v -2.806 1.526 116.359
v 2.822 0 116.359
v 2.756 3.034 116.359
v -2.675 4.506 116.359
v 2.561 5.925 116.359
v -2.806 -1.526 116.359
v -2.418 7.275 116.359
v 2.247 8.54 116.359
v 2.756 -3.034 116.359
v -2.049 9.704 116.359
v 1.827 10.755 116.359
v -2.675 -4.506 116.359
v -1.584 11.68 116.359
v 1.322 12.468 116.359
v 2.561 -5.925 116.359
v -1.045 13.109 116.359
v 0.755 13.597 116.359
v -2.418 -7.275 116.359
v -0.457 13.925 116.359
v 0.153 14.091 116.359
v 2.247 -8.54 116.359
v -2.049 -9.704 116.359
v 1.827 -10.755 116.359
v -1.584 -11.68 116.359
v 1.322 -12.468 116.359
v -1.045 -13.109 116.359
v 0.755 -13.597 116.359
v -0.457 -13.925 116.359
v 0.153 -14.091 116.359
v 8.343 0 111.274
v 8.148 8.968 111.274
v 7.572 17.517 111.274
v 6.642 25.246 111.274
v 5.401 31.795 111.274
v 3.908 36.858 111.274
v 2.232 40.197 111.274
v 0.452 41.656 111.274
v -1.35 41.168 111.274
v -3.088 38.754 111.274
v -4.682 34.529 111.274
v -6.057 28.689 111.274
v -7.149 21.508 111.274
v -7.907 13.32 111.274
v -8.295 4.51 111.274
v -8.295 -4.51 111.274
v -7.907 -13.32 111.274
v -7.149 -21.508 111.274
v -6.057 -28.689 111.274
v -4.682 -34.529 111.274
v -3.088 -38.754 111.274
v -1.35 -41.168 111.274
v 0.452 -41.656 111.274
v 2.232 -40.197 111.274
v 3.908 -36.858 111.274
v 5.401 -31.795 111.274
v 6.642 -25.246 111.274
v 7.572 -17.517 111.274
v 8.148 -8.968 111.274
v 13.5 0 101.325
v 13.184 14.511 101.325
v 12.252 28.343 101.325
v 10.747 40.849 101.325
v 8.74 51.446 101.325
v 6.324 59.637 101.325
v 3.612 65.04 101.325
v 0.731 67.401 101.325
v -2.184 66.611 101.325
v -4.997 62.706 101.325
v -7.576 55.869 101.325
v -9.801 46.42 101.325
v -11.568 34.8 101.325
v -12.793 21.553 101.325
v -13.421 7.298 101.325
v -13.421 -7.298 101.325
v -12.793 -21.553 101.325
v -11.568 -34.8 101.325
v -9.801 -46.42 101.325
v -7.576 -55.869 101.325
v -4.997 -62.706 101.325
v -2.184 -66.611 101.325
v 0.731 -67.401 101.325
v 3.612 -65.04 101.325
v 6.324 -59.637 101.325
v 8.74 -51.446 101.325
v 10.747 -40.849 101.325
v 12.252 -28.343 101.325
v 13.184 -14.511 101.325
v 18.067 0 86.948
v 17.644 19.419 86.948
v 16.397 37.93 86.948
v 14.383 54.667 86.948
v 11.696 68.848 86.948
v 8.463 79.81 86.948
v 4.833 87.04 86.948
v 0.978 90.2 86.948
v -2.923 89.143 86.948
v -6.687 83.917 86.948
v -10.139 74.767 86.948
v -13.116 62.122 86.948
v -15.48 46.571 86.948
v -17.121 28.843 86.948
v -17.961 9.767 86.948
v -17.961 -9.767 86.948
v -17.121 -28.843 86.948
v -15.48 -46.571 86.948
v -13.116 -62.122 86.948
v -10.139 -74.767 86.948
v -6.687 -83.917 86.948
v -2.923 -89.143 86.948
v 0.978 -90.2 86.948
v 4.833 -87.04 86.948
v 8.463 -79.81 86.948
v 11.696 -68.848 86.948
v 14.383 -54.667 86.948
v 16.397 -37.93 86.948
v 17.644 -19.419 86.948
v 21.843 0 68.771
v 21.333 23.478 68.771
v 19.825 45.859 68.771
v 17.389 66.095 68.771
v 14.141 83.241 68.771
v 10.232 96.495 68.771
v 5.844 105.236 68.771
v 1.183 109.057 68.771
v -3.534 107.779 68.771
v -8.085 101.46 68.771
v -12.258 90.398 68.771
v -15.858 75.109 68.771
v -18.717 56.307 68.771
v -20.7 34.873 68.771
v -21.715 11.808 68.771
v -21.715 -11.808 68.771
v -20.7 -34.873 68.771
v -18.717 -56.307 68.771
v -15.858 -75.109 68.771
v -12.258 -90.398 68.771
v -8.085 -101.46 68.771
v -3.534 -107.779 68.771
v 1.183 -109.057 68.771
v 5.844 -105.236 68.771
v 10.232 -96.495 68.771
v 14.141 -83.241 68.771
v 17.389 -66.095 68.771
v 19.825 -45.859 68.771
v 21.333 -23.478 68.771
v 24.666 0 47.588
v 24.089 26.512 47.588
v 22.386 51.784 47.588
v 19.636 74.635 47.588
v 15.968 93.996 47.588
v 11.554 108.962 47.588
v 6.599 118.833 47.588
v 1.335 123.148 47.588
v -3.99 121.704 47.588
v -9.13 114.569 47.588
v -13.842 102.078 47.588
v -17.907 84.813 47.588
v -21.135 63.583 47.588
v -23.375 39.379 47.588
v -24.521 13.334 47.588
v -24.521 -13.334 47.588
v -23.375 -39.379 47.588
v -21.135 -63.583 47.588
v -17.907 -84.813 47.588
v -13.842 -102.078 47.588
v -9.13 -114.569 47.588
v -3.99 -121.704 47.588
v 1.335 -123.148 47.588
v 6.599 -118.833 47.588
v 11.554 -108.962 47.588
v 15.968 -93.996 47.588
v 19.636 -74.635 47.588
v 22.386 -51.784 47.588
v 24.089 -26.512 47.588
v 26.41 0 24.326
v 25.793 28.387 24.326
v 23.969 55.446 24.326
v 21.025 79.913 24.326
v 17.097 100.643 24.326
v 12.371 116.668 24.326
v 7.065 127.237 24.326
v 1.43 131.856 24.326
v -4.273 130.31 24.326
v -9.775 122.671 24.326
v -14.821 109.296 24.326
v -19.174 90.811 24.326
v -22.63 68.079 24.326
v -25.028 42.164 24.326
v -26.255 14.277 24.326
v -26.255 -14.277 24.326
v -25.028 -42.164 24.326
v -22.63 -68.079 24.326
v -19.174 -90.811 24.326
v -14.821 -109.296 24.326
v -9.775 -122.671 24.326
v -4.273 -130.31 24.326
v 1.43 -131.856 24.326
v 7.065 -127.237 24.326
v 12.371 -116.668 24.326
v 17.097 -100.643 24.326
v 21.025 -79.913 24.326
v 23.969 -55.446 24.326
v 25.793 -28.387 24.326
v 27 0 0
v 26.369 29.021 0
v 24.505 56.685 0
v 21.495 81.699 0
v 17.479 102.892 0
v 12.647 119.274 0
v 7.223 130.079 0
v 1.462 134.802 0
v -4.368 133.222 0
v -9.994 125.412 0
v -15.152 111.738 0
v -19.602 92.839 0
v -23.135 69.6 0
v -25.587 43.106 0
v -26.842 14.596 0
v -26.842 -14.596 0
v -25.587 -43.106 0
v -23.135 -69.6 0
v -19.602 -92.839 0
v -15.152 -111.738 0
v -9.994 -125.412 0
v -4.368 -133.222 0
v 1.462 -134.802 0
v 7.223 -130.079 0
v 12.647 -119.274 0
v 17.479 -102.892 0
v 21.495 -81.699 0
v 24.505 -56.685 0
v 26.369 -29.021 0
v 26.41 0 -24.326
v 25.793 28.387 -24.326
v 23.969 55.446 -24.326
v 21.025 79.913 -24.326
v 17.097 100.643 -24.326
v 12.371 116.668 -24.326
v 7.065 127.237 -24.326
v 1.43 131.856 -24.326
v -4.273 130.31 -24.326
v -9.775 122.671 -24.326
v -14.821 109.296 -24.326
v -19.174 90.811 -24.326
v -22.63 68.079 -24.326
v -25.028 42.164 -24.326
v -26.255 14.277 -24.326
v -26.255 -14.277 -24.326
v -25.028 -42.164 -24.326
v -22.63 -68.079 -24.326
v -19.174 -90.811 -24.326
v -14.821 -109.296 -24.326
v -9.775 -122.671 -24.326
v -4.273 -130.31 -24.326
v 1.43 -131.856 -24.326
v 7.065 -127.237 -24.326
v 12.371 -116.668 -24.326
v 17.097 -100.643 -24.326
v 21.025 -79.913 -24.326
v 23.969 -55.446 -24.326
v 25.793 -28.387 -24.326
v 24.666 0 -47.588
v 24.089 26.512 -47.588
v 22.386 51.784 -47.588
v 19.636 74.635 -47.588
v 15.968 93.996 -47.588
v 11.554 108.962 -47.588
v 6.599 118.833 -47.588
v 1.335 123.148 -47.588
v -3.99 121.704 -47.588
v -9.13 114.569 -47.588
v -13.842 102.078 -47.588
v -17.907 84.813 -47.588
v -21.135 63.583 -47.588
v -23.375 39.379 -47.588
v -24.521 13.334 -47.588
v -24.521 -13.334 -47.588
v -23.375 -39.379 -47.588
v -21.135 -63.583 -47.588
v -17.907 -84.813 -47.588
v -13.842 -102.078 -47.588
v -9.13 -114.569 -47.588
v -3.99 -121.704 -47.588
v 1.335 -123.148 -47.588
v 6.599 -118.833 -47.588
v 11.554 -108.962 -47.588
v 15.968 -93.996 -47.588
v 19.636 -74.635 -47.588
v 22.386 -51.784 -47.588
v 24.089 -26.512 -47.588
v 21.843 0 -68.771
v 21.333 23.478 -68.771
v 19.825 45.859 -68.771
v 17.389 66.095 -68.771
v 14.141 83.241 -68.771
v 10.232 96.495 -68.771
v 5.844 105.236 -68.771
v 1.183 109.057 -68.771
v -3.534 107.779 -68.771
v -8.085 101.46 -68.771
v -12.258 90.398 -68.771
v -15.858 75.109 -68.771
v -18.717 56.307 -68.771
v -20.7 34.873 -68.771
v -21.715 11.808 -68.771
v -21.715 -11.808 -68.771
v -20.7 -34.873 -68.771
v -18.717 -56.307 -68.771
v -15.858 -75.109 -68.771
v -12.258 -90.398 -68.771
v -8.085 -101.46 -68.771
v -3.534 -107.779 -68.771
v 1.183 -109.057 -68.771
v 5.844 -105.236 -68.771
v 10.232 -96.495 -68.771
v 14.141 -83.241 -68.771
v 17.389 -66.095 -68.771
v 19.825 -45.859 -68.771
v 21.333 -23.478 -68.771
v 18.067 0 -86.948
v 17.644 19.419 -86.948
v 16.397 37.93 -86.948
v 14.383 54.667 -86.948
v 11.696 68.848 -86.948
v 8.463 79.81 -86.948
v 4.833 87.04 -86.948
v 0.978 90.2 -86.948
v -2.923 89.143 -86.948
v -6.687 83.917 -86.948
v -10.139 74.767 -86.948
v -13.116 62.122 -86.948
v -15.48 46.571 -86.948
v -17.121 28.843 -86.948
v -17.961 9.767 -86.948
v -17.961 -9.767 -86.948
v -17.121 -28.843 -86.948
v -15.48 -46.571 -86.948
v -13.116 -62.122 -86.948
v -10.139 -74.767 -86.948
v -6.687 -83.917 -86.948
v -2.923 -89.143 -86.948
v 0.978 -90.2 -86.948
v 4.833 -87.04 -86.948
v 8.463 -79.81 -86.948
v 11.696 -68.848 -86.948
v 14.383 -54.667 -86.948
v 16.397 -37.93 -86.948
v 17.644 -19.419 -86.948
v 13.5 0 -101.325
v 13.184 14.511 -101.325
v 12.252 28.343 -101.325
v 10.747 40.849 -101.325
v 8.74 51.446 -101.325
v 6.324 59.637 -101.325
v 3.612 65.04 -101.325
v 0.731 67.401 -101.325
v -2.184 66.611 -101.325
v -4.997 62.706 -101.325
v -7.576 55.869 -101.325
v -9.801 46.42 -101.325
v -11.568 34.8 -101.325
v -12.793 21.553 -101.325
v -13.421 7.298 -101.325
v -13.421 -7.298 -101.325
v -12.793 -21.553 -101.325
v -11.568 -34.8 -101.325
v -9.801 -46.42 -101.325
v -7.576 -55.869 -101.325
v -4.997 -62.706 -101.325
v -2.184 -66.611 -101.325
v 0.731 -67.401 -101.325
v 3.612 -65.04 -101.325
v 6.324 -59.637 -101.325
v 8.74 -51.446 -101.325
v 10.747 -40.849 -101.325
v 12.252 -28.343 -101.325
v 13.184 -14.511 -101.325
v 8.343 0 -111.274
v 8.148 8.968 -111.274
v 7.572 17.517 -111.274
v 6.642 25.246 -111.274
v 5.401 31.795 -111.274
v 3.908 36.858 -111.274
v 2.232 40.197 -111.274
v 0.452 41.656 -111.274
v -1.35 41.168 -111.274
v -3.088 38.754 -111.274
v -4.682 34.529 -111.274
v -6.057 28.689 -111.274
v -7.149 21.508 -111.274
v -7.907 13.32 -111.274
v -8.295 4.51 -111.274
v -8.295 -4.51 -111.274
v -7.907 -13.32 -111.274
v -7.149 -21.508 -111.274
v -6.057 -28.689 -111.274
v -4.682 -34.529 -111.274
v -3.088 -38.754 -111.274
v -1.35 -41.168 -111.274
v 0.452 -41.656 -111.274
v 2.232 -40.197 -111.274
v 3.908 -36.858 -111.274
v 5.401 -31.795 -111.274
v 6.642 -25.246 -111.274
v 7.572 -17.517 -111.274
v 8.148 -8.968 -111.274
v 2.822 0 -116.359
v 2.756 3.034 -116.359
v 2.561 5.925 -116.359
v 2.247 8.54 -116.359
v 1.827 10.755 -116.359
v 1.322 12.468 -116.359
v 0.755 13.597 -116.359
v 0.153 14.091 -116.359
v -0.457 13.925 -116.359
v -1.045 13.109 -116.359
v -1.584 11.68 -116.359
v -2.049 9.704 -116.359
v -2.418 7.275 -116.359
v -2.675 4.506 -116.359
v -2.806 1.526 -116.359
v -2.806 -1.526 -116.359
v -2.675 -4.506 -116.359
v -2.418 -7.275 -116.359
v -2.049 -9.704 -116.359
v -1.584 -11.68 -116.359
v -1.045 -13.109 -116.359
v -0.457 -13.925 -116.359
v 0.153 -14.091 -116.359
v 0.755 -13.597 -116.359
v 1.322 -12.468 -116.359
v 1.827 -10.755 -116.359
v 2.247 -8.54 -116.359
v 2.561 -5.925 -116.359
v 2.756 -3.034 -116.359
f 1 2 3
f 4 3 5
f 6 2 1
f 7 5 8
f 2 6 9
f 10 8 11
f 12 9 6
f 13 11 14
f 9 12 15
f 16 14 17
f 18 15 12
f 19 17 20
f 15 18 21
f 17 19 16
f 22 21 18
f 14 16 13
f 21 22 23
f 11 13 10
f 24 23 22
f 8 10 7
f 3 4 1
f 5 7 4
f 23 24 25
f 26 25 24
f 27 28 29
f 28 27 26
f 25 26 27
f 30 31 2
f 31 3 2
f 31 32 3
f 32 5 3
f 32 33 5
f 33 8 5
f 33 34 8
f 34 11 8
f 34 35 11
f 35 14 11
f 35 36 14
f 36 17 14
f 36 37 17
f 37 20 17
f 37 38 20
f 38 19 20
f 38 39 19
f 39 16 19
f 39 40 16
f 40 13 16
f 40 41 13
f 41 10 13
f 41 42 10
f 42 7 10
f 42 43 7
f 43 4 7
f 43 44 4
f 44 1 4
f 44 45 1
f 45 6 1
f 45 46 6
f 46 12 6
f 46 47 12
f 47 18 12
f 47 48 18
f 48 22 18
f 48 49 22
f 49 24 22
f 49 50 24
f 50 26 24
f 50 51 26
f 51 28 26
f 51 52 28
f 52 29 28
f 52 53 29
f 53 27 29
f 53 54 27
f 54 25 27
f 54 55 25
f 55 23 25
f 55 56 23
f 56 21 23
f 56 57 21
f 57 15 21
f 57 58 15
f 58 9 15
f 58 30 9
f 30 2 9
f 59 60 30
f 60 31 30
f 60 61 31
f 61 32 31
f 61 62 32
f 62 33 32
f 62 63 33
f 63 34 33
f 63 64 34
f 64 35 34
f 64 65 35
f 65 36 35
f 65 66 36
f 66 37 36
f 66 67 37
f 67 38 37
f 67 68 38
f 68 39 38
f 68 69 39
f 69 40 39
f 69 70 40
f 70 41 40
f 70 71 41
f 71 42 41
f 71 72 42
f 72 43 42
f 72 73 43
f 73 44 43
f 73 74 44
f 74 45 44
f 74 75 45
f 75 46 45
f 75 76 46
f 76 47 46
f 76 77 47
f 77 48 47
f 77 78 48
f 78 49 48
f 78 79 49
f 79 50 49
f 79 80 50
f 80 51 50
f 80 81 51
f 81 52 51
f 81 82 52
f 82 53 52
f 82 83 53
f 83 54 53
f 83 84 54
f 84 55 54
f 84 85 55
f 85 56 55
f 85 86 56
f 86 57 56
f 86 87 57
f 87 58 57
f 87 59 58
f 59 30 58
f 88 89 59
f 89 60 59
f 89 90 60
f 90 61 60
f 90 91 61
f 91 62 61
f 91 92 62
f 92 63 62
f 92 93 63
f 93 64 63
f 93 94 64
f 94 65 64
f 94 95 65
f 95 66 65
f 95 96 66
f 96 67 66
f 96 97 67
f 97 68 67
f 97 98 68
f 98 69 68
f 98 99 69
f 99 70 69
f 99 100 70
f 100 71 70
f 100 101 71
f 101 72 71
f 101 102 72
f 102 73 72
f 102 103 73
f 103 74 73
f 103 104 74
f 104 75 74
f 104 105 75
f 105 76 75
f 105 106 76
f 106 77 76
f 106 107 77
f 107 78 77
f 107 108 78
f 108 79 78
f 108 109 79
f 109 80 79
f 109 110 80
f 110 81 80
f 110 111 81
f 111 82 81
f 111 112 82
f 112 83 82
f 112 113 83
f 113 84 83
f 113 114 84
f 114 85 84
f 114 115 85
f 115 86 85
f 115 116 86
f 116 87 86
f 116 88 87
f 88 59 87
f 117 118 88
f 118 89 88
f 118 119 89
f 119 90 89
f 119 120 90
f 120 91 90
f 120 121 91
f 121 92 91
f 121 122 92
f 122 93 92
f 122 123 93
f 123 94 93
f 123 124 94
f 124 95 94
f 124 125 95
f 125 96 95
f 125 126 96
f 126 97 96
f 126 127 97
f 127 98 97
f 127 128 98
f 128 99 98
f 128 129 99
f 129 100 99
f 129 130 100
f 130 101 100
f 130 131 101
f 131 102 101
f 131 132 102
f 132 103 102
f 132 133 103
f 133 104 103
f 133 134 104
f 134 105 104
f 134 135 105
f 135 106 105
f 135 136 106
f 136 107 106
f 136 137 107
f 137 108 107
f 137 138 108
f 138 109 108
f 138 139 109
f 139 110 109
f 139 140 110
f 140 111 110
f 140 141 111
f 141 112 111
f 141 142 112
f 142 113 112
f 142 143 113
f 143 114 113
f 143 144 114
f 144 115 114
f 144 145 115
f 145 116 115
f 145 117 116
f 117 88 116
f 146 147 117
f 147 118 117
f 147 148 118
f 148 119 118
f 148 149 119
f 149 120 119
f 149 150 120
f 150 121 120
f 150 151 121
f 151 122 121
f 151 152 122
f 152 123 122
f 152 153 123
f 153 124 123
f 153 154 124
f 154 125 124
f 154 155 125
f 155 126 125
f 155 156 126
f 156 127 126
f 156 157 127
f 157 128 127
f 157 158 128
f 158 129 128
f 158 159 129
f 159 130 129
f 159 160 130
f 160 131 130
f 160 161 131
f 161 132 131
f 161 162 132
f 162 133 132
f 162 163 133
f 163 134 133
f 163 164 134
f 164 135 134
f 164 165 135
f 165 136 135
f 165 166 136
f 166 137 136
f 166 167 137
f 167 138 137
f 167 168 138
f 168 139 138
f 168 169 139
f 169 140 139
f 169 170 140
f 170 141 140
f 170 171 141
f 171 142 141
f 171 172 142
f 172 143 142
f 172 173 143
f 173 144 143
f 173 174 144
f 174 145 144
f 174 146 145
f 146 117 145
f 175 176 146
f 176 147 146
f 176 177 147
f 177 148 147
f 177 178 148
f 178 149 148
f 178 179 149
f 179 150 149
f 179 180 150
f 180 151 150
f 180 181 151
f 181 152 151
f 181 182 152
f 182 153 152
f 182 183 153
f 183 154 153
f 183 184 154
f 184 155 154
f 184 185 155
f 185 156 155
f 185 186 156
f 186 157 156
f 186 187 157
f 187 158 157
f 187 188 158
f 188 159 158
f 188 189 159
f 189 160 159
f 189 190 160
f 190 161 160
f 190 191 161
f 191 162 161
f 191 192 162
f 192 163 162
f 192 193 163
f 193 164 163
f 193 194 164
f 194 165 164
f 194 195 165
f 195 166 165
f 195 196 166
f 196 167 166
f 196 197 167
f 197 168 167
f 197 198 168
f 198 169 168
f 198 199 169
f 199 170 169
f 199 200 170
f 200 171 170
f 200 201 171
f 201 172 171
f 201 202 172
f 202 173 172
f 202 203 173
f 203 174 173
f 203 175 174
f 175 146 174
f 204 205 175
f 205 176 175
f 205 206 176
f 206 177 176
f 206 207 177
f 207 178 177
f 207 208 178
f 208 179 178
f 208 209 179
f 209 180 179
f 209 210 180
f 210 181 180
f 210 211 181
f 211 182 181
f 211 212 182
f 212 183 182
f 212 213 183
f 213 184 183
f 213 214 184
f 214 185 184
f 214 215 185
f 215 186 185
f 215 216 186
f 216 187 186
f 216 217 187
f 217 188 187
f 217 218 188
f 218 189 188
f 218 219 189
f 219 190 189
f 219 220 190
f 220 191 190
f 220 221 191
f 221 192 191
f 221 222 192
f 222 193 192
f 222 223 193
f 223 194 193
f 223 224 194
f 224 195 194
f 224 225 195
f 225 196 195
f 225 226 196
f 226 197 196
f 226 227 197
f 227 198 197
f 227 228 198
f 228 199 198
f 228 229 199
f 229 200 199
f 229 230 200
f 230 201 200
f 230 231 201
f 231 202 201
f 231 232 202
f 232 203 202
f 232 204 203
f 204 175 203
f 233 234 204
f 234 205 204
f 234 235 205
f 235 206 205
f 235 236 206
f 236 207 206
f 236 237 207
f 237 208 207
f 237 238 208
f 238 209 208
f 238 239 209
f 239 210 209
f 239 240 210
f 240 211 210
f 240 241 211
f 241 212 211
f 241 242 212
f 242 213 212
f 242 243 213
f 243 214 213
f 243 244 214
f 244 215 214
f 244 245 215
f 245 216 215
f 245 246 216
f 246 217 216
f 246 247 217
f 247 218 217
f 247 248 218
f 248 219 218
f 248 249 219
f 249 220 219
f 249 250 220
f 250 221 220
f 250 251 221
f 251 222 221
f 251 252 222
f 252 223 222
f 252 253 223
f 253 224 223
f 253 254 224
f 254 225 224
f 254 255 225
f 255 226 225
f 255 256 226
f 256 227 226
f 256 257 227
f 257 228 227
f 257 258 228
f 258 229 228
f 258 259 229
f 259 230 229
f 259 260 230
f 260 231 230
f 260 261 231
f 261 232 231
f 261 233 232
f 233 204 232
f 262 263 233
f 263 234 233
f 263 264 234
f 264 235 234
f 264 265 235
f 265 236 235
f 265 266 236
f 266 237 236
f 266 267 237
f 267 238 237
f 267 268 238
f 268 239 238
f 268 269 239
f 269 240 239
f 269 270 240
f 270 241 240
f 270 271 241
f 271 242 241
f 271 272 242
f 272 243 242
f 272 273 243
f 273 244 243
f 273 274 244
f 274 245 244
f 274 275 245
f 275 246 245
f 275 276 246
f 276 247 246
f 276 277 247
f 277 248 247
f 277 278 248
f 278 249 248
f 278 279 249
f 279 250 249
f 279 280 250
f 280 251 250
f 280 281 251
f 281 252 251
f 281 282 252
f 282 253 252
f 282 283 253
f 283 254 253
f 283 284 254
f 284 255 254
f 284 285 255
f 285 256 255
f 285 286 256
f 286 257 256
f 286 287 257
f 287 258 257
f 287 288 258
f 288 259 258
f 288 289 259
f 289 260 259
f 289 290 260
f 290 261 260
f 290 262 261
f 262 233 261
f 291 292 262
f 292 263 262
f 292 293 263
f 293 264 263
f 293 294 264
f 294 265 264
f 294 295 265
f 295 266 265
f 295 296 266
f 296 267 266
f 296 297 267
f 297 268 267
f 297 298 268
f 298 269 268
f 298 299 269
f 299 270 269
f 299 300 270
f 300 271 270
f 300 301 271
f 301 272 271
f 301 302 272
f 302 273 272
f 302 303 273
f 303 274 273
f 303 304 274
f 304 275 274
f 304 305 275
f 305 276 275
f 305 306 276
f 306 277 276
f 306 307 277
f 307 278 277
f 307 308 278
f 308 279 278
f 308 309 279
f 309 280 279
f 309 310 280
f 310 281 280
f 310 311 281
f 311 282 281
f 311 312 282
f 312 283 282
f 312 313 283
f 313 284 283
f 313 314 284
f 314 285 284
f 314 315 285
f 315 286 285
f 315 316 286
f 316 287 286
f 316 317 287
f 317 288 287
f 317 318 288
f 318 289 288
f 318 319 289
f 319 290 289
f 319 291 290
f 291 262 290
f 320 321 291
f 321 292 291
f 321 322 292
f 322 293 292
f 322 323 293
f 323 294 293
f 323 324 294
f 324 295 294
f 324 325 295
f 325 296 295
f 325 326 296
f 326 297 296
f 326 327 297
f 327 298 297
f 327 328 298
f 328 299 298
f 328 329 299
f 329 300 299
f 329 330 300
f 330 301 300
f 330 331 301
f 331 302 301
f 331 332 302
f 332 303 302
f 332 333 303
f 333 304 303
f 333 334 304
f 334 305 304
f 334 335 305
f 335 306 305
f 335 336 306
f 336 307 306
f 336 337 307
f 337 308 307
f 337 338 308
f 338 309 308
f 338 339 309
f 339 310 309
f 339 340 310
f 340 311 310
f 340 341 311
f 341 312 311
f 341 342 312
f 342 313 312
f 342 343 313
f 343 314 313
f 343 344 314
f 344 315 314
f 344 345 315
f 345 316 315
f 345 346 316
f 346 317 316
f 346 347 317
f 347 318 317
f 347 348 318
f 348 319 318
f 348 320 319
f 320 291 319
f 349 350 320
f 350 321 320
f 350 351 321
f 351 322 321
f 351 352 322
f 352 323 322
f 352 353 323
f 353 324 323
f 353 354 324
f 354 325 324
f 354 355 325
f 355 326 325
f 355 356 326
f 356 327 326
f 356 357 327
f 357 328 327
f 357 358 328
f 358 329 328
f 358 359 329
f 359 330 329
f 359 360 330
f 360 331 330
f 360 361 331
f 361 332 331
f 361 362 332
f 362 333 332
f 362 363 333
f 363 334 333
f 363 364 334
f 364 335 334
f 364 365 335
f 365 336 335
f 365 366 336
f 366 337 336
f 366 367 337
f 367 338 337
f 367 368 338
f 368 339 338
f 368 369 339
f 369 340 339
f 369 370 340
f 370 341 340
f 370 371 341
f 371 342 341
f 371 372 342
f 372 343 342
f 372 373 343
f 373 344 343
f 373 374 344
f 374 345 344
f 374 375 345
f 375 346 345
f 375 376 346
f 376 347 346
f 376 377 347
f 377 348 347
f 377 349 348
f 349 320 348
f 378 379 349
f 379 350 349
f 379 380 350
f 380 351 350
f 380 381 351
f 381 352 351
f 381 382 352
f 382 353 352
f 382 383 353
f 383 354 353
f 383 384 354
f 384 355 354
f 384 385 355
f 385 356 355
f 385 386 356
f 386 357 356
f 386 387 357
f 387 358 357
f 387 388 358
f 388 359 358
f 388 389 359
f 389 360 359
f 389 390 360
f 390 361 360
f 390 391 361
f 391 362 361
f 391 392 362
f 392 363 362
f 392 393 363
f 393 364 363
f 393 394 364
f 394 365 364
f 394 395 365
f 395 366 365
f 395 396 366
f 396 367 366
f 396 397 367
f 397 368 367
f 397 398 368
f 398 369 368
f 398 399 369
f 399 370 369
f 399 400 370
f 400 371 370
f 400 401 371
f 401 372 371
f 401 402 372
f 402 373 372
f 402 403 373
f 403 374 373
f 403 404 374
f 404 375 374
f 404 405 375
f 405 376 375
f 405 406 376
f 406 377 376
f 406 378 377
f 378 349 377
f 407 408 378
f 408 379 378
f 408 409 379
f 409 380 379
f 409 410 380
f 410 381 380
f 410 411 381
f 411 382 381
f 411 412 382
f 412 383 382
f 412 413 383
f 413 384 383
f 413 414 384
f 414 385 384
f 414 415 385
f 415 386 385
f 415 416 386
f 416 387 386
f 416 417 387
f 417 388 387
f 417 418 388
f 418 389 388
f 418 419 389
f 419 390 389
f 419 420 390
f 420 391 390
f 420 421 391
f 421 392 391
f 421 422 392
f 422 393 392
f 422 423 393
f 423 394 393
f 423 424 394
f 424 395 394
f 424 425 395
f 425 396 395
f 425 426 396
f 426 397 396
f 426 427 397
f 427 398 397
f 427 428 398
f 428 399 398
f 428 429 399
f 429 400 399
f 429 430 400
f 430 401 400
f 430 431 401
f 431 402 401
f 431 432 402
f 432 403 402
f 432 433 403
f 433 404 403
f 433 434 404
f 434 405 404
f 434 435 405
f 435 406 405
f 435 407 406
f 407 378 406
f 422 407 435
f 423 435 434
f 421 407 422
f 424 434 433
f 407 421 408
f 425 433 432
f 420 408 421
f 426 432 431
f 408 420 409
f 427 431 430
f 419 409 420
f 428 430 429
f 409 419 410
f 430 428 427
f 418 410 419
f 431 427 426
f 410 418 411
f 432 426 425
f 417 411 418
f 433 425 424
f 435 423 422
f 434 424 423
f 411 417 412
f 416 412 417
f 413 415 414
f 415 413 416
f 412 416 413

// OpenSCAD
// Generated by SolidPython 1.0.1 on 2020-07-29 00:46:45


scale(v = [3, 15, 13]) {
	sphere(r = 9);
}
/***********************************************
*********      SolidPython code:      **********
************************************************
 
# import packages: SolidPython
from solid import *
from solid.utils import *
from itertools import chain, combinations, permutations


class Resize:

    def __init__(self, scad_file):
        self.scad_file = scad_file
        #self.scad_file = import_scad(scad_file)
        # cone/cylinder param:
        self.r1 = 0
        self.r2 = 0
        self.h = 0
        # rectangular prism param:
        self.w = 0
        self.l = 0
        # ellipse param:
        self.r = 0

    # import OpenScad code (file name corresponds to shape)


    # classify shape + parameters
    def assign(self, param1, param2, param3):
        if self.scad_file == 'cone.scad':
            self.r1 = param1
            self.r2 = param2
            self.h = param3
        elif self.scad_file == 'cylinder.scad':
            self.r1 = param1
            self.r2 = param2
            self.h = param3
        elif self.scad_file == 'rectangularPrism.scad':
            self.h = param1
            self.l = param2
            self.w = param3
        else:
            self.r = param1
            self.h = param2

    # resize parameters
    def iterate(self):
        x = range(3, 20, 2)
        i = 1
        if self.scad_file == 'cone.scad':
            tempList = list(permutations(x, 2))
            for temp in tempList:
                param1 = temp[0]
                param2 = temp[1]
                filepath = 'produced_scad_files/' + 'cone' + str(param1) + '_' + str(param2) + '_' + '.scad'
                scad_render_to_file(cylinder(h=param1, r1=param2, r2=0), filepath)

        elif self.scad_file == 'cylinder.scad':
            tempList = list(permutations(x, 3))
            for temp in tempList:
                param1 = temp[0]
                param2 = temp[1]
                filepath = 'produced_scad_files/' + 'cylinder' + str(param1) + '_' + str(param2) + '_' + '.scad'
                scad_render_to_file(cylinder(h=param1, r1=param2, r2=param2), filepath)

        elif self.scad_file == 'rectangularPrism.scad':
            tempList = list(permutations(x, 3))
            for temp in tempList:
                param1 = temp[0]
                param2 = temp[1]
                param3 = temp[2]
                filepath = 'produced_scad_files/' + 'rectangularPrism' + str(param1) + '_' + str(param2) + '_' + str(
                    param3) + '.scad'
                scad_render_to_file(cube(size=(param1, param2, param3)), filepath)

        elif self.scad_file == 'ellipse.scad':
            tempList = list(permutations(x, 4))
            for temp in tempList:
                param1 = temp[0]
                param2 = temp[1]
                param3 = temp[2]
                param4 = temp[3]
                filepath = 'produced_scad_files/' + 'ellipse' + str(param1) + '_' + str(param2) + '_' + str(param3) + '_' + str(param4) + '.scad'
                scad_render_to_file(scale([param1, param2, param3])(sphere(r=param4)), filepath)

    def render_to_scadfile(self):
        scad_render_to_file(scad, 'example.scad') 
 
************************************************/
